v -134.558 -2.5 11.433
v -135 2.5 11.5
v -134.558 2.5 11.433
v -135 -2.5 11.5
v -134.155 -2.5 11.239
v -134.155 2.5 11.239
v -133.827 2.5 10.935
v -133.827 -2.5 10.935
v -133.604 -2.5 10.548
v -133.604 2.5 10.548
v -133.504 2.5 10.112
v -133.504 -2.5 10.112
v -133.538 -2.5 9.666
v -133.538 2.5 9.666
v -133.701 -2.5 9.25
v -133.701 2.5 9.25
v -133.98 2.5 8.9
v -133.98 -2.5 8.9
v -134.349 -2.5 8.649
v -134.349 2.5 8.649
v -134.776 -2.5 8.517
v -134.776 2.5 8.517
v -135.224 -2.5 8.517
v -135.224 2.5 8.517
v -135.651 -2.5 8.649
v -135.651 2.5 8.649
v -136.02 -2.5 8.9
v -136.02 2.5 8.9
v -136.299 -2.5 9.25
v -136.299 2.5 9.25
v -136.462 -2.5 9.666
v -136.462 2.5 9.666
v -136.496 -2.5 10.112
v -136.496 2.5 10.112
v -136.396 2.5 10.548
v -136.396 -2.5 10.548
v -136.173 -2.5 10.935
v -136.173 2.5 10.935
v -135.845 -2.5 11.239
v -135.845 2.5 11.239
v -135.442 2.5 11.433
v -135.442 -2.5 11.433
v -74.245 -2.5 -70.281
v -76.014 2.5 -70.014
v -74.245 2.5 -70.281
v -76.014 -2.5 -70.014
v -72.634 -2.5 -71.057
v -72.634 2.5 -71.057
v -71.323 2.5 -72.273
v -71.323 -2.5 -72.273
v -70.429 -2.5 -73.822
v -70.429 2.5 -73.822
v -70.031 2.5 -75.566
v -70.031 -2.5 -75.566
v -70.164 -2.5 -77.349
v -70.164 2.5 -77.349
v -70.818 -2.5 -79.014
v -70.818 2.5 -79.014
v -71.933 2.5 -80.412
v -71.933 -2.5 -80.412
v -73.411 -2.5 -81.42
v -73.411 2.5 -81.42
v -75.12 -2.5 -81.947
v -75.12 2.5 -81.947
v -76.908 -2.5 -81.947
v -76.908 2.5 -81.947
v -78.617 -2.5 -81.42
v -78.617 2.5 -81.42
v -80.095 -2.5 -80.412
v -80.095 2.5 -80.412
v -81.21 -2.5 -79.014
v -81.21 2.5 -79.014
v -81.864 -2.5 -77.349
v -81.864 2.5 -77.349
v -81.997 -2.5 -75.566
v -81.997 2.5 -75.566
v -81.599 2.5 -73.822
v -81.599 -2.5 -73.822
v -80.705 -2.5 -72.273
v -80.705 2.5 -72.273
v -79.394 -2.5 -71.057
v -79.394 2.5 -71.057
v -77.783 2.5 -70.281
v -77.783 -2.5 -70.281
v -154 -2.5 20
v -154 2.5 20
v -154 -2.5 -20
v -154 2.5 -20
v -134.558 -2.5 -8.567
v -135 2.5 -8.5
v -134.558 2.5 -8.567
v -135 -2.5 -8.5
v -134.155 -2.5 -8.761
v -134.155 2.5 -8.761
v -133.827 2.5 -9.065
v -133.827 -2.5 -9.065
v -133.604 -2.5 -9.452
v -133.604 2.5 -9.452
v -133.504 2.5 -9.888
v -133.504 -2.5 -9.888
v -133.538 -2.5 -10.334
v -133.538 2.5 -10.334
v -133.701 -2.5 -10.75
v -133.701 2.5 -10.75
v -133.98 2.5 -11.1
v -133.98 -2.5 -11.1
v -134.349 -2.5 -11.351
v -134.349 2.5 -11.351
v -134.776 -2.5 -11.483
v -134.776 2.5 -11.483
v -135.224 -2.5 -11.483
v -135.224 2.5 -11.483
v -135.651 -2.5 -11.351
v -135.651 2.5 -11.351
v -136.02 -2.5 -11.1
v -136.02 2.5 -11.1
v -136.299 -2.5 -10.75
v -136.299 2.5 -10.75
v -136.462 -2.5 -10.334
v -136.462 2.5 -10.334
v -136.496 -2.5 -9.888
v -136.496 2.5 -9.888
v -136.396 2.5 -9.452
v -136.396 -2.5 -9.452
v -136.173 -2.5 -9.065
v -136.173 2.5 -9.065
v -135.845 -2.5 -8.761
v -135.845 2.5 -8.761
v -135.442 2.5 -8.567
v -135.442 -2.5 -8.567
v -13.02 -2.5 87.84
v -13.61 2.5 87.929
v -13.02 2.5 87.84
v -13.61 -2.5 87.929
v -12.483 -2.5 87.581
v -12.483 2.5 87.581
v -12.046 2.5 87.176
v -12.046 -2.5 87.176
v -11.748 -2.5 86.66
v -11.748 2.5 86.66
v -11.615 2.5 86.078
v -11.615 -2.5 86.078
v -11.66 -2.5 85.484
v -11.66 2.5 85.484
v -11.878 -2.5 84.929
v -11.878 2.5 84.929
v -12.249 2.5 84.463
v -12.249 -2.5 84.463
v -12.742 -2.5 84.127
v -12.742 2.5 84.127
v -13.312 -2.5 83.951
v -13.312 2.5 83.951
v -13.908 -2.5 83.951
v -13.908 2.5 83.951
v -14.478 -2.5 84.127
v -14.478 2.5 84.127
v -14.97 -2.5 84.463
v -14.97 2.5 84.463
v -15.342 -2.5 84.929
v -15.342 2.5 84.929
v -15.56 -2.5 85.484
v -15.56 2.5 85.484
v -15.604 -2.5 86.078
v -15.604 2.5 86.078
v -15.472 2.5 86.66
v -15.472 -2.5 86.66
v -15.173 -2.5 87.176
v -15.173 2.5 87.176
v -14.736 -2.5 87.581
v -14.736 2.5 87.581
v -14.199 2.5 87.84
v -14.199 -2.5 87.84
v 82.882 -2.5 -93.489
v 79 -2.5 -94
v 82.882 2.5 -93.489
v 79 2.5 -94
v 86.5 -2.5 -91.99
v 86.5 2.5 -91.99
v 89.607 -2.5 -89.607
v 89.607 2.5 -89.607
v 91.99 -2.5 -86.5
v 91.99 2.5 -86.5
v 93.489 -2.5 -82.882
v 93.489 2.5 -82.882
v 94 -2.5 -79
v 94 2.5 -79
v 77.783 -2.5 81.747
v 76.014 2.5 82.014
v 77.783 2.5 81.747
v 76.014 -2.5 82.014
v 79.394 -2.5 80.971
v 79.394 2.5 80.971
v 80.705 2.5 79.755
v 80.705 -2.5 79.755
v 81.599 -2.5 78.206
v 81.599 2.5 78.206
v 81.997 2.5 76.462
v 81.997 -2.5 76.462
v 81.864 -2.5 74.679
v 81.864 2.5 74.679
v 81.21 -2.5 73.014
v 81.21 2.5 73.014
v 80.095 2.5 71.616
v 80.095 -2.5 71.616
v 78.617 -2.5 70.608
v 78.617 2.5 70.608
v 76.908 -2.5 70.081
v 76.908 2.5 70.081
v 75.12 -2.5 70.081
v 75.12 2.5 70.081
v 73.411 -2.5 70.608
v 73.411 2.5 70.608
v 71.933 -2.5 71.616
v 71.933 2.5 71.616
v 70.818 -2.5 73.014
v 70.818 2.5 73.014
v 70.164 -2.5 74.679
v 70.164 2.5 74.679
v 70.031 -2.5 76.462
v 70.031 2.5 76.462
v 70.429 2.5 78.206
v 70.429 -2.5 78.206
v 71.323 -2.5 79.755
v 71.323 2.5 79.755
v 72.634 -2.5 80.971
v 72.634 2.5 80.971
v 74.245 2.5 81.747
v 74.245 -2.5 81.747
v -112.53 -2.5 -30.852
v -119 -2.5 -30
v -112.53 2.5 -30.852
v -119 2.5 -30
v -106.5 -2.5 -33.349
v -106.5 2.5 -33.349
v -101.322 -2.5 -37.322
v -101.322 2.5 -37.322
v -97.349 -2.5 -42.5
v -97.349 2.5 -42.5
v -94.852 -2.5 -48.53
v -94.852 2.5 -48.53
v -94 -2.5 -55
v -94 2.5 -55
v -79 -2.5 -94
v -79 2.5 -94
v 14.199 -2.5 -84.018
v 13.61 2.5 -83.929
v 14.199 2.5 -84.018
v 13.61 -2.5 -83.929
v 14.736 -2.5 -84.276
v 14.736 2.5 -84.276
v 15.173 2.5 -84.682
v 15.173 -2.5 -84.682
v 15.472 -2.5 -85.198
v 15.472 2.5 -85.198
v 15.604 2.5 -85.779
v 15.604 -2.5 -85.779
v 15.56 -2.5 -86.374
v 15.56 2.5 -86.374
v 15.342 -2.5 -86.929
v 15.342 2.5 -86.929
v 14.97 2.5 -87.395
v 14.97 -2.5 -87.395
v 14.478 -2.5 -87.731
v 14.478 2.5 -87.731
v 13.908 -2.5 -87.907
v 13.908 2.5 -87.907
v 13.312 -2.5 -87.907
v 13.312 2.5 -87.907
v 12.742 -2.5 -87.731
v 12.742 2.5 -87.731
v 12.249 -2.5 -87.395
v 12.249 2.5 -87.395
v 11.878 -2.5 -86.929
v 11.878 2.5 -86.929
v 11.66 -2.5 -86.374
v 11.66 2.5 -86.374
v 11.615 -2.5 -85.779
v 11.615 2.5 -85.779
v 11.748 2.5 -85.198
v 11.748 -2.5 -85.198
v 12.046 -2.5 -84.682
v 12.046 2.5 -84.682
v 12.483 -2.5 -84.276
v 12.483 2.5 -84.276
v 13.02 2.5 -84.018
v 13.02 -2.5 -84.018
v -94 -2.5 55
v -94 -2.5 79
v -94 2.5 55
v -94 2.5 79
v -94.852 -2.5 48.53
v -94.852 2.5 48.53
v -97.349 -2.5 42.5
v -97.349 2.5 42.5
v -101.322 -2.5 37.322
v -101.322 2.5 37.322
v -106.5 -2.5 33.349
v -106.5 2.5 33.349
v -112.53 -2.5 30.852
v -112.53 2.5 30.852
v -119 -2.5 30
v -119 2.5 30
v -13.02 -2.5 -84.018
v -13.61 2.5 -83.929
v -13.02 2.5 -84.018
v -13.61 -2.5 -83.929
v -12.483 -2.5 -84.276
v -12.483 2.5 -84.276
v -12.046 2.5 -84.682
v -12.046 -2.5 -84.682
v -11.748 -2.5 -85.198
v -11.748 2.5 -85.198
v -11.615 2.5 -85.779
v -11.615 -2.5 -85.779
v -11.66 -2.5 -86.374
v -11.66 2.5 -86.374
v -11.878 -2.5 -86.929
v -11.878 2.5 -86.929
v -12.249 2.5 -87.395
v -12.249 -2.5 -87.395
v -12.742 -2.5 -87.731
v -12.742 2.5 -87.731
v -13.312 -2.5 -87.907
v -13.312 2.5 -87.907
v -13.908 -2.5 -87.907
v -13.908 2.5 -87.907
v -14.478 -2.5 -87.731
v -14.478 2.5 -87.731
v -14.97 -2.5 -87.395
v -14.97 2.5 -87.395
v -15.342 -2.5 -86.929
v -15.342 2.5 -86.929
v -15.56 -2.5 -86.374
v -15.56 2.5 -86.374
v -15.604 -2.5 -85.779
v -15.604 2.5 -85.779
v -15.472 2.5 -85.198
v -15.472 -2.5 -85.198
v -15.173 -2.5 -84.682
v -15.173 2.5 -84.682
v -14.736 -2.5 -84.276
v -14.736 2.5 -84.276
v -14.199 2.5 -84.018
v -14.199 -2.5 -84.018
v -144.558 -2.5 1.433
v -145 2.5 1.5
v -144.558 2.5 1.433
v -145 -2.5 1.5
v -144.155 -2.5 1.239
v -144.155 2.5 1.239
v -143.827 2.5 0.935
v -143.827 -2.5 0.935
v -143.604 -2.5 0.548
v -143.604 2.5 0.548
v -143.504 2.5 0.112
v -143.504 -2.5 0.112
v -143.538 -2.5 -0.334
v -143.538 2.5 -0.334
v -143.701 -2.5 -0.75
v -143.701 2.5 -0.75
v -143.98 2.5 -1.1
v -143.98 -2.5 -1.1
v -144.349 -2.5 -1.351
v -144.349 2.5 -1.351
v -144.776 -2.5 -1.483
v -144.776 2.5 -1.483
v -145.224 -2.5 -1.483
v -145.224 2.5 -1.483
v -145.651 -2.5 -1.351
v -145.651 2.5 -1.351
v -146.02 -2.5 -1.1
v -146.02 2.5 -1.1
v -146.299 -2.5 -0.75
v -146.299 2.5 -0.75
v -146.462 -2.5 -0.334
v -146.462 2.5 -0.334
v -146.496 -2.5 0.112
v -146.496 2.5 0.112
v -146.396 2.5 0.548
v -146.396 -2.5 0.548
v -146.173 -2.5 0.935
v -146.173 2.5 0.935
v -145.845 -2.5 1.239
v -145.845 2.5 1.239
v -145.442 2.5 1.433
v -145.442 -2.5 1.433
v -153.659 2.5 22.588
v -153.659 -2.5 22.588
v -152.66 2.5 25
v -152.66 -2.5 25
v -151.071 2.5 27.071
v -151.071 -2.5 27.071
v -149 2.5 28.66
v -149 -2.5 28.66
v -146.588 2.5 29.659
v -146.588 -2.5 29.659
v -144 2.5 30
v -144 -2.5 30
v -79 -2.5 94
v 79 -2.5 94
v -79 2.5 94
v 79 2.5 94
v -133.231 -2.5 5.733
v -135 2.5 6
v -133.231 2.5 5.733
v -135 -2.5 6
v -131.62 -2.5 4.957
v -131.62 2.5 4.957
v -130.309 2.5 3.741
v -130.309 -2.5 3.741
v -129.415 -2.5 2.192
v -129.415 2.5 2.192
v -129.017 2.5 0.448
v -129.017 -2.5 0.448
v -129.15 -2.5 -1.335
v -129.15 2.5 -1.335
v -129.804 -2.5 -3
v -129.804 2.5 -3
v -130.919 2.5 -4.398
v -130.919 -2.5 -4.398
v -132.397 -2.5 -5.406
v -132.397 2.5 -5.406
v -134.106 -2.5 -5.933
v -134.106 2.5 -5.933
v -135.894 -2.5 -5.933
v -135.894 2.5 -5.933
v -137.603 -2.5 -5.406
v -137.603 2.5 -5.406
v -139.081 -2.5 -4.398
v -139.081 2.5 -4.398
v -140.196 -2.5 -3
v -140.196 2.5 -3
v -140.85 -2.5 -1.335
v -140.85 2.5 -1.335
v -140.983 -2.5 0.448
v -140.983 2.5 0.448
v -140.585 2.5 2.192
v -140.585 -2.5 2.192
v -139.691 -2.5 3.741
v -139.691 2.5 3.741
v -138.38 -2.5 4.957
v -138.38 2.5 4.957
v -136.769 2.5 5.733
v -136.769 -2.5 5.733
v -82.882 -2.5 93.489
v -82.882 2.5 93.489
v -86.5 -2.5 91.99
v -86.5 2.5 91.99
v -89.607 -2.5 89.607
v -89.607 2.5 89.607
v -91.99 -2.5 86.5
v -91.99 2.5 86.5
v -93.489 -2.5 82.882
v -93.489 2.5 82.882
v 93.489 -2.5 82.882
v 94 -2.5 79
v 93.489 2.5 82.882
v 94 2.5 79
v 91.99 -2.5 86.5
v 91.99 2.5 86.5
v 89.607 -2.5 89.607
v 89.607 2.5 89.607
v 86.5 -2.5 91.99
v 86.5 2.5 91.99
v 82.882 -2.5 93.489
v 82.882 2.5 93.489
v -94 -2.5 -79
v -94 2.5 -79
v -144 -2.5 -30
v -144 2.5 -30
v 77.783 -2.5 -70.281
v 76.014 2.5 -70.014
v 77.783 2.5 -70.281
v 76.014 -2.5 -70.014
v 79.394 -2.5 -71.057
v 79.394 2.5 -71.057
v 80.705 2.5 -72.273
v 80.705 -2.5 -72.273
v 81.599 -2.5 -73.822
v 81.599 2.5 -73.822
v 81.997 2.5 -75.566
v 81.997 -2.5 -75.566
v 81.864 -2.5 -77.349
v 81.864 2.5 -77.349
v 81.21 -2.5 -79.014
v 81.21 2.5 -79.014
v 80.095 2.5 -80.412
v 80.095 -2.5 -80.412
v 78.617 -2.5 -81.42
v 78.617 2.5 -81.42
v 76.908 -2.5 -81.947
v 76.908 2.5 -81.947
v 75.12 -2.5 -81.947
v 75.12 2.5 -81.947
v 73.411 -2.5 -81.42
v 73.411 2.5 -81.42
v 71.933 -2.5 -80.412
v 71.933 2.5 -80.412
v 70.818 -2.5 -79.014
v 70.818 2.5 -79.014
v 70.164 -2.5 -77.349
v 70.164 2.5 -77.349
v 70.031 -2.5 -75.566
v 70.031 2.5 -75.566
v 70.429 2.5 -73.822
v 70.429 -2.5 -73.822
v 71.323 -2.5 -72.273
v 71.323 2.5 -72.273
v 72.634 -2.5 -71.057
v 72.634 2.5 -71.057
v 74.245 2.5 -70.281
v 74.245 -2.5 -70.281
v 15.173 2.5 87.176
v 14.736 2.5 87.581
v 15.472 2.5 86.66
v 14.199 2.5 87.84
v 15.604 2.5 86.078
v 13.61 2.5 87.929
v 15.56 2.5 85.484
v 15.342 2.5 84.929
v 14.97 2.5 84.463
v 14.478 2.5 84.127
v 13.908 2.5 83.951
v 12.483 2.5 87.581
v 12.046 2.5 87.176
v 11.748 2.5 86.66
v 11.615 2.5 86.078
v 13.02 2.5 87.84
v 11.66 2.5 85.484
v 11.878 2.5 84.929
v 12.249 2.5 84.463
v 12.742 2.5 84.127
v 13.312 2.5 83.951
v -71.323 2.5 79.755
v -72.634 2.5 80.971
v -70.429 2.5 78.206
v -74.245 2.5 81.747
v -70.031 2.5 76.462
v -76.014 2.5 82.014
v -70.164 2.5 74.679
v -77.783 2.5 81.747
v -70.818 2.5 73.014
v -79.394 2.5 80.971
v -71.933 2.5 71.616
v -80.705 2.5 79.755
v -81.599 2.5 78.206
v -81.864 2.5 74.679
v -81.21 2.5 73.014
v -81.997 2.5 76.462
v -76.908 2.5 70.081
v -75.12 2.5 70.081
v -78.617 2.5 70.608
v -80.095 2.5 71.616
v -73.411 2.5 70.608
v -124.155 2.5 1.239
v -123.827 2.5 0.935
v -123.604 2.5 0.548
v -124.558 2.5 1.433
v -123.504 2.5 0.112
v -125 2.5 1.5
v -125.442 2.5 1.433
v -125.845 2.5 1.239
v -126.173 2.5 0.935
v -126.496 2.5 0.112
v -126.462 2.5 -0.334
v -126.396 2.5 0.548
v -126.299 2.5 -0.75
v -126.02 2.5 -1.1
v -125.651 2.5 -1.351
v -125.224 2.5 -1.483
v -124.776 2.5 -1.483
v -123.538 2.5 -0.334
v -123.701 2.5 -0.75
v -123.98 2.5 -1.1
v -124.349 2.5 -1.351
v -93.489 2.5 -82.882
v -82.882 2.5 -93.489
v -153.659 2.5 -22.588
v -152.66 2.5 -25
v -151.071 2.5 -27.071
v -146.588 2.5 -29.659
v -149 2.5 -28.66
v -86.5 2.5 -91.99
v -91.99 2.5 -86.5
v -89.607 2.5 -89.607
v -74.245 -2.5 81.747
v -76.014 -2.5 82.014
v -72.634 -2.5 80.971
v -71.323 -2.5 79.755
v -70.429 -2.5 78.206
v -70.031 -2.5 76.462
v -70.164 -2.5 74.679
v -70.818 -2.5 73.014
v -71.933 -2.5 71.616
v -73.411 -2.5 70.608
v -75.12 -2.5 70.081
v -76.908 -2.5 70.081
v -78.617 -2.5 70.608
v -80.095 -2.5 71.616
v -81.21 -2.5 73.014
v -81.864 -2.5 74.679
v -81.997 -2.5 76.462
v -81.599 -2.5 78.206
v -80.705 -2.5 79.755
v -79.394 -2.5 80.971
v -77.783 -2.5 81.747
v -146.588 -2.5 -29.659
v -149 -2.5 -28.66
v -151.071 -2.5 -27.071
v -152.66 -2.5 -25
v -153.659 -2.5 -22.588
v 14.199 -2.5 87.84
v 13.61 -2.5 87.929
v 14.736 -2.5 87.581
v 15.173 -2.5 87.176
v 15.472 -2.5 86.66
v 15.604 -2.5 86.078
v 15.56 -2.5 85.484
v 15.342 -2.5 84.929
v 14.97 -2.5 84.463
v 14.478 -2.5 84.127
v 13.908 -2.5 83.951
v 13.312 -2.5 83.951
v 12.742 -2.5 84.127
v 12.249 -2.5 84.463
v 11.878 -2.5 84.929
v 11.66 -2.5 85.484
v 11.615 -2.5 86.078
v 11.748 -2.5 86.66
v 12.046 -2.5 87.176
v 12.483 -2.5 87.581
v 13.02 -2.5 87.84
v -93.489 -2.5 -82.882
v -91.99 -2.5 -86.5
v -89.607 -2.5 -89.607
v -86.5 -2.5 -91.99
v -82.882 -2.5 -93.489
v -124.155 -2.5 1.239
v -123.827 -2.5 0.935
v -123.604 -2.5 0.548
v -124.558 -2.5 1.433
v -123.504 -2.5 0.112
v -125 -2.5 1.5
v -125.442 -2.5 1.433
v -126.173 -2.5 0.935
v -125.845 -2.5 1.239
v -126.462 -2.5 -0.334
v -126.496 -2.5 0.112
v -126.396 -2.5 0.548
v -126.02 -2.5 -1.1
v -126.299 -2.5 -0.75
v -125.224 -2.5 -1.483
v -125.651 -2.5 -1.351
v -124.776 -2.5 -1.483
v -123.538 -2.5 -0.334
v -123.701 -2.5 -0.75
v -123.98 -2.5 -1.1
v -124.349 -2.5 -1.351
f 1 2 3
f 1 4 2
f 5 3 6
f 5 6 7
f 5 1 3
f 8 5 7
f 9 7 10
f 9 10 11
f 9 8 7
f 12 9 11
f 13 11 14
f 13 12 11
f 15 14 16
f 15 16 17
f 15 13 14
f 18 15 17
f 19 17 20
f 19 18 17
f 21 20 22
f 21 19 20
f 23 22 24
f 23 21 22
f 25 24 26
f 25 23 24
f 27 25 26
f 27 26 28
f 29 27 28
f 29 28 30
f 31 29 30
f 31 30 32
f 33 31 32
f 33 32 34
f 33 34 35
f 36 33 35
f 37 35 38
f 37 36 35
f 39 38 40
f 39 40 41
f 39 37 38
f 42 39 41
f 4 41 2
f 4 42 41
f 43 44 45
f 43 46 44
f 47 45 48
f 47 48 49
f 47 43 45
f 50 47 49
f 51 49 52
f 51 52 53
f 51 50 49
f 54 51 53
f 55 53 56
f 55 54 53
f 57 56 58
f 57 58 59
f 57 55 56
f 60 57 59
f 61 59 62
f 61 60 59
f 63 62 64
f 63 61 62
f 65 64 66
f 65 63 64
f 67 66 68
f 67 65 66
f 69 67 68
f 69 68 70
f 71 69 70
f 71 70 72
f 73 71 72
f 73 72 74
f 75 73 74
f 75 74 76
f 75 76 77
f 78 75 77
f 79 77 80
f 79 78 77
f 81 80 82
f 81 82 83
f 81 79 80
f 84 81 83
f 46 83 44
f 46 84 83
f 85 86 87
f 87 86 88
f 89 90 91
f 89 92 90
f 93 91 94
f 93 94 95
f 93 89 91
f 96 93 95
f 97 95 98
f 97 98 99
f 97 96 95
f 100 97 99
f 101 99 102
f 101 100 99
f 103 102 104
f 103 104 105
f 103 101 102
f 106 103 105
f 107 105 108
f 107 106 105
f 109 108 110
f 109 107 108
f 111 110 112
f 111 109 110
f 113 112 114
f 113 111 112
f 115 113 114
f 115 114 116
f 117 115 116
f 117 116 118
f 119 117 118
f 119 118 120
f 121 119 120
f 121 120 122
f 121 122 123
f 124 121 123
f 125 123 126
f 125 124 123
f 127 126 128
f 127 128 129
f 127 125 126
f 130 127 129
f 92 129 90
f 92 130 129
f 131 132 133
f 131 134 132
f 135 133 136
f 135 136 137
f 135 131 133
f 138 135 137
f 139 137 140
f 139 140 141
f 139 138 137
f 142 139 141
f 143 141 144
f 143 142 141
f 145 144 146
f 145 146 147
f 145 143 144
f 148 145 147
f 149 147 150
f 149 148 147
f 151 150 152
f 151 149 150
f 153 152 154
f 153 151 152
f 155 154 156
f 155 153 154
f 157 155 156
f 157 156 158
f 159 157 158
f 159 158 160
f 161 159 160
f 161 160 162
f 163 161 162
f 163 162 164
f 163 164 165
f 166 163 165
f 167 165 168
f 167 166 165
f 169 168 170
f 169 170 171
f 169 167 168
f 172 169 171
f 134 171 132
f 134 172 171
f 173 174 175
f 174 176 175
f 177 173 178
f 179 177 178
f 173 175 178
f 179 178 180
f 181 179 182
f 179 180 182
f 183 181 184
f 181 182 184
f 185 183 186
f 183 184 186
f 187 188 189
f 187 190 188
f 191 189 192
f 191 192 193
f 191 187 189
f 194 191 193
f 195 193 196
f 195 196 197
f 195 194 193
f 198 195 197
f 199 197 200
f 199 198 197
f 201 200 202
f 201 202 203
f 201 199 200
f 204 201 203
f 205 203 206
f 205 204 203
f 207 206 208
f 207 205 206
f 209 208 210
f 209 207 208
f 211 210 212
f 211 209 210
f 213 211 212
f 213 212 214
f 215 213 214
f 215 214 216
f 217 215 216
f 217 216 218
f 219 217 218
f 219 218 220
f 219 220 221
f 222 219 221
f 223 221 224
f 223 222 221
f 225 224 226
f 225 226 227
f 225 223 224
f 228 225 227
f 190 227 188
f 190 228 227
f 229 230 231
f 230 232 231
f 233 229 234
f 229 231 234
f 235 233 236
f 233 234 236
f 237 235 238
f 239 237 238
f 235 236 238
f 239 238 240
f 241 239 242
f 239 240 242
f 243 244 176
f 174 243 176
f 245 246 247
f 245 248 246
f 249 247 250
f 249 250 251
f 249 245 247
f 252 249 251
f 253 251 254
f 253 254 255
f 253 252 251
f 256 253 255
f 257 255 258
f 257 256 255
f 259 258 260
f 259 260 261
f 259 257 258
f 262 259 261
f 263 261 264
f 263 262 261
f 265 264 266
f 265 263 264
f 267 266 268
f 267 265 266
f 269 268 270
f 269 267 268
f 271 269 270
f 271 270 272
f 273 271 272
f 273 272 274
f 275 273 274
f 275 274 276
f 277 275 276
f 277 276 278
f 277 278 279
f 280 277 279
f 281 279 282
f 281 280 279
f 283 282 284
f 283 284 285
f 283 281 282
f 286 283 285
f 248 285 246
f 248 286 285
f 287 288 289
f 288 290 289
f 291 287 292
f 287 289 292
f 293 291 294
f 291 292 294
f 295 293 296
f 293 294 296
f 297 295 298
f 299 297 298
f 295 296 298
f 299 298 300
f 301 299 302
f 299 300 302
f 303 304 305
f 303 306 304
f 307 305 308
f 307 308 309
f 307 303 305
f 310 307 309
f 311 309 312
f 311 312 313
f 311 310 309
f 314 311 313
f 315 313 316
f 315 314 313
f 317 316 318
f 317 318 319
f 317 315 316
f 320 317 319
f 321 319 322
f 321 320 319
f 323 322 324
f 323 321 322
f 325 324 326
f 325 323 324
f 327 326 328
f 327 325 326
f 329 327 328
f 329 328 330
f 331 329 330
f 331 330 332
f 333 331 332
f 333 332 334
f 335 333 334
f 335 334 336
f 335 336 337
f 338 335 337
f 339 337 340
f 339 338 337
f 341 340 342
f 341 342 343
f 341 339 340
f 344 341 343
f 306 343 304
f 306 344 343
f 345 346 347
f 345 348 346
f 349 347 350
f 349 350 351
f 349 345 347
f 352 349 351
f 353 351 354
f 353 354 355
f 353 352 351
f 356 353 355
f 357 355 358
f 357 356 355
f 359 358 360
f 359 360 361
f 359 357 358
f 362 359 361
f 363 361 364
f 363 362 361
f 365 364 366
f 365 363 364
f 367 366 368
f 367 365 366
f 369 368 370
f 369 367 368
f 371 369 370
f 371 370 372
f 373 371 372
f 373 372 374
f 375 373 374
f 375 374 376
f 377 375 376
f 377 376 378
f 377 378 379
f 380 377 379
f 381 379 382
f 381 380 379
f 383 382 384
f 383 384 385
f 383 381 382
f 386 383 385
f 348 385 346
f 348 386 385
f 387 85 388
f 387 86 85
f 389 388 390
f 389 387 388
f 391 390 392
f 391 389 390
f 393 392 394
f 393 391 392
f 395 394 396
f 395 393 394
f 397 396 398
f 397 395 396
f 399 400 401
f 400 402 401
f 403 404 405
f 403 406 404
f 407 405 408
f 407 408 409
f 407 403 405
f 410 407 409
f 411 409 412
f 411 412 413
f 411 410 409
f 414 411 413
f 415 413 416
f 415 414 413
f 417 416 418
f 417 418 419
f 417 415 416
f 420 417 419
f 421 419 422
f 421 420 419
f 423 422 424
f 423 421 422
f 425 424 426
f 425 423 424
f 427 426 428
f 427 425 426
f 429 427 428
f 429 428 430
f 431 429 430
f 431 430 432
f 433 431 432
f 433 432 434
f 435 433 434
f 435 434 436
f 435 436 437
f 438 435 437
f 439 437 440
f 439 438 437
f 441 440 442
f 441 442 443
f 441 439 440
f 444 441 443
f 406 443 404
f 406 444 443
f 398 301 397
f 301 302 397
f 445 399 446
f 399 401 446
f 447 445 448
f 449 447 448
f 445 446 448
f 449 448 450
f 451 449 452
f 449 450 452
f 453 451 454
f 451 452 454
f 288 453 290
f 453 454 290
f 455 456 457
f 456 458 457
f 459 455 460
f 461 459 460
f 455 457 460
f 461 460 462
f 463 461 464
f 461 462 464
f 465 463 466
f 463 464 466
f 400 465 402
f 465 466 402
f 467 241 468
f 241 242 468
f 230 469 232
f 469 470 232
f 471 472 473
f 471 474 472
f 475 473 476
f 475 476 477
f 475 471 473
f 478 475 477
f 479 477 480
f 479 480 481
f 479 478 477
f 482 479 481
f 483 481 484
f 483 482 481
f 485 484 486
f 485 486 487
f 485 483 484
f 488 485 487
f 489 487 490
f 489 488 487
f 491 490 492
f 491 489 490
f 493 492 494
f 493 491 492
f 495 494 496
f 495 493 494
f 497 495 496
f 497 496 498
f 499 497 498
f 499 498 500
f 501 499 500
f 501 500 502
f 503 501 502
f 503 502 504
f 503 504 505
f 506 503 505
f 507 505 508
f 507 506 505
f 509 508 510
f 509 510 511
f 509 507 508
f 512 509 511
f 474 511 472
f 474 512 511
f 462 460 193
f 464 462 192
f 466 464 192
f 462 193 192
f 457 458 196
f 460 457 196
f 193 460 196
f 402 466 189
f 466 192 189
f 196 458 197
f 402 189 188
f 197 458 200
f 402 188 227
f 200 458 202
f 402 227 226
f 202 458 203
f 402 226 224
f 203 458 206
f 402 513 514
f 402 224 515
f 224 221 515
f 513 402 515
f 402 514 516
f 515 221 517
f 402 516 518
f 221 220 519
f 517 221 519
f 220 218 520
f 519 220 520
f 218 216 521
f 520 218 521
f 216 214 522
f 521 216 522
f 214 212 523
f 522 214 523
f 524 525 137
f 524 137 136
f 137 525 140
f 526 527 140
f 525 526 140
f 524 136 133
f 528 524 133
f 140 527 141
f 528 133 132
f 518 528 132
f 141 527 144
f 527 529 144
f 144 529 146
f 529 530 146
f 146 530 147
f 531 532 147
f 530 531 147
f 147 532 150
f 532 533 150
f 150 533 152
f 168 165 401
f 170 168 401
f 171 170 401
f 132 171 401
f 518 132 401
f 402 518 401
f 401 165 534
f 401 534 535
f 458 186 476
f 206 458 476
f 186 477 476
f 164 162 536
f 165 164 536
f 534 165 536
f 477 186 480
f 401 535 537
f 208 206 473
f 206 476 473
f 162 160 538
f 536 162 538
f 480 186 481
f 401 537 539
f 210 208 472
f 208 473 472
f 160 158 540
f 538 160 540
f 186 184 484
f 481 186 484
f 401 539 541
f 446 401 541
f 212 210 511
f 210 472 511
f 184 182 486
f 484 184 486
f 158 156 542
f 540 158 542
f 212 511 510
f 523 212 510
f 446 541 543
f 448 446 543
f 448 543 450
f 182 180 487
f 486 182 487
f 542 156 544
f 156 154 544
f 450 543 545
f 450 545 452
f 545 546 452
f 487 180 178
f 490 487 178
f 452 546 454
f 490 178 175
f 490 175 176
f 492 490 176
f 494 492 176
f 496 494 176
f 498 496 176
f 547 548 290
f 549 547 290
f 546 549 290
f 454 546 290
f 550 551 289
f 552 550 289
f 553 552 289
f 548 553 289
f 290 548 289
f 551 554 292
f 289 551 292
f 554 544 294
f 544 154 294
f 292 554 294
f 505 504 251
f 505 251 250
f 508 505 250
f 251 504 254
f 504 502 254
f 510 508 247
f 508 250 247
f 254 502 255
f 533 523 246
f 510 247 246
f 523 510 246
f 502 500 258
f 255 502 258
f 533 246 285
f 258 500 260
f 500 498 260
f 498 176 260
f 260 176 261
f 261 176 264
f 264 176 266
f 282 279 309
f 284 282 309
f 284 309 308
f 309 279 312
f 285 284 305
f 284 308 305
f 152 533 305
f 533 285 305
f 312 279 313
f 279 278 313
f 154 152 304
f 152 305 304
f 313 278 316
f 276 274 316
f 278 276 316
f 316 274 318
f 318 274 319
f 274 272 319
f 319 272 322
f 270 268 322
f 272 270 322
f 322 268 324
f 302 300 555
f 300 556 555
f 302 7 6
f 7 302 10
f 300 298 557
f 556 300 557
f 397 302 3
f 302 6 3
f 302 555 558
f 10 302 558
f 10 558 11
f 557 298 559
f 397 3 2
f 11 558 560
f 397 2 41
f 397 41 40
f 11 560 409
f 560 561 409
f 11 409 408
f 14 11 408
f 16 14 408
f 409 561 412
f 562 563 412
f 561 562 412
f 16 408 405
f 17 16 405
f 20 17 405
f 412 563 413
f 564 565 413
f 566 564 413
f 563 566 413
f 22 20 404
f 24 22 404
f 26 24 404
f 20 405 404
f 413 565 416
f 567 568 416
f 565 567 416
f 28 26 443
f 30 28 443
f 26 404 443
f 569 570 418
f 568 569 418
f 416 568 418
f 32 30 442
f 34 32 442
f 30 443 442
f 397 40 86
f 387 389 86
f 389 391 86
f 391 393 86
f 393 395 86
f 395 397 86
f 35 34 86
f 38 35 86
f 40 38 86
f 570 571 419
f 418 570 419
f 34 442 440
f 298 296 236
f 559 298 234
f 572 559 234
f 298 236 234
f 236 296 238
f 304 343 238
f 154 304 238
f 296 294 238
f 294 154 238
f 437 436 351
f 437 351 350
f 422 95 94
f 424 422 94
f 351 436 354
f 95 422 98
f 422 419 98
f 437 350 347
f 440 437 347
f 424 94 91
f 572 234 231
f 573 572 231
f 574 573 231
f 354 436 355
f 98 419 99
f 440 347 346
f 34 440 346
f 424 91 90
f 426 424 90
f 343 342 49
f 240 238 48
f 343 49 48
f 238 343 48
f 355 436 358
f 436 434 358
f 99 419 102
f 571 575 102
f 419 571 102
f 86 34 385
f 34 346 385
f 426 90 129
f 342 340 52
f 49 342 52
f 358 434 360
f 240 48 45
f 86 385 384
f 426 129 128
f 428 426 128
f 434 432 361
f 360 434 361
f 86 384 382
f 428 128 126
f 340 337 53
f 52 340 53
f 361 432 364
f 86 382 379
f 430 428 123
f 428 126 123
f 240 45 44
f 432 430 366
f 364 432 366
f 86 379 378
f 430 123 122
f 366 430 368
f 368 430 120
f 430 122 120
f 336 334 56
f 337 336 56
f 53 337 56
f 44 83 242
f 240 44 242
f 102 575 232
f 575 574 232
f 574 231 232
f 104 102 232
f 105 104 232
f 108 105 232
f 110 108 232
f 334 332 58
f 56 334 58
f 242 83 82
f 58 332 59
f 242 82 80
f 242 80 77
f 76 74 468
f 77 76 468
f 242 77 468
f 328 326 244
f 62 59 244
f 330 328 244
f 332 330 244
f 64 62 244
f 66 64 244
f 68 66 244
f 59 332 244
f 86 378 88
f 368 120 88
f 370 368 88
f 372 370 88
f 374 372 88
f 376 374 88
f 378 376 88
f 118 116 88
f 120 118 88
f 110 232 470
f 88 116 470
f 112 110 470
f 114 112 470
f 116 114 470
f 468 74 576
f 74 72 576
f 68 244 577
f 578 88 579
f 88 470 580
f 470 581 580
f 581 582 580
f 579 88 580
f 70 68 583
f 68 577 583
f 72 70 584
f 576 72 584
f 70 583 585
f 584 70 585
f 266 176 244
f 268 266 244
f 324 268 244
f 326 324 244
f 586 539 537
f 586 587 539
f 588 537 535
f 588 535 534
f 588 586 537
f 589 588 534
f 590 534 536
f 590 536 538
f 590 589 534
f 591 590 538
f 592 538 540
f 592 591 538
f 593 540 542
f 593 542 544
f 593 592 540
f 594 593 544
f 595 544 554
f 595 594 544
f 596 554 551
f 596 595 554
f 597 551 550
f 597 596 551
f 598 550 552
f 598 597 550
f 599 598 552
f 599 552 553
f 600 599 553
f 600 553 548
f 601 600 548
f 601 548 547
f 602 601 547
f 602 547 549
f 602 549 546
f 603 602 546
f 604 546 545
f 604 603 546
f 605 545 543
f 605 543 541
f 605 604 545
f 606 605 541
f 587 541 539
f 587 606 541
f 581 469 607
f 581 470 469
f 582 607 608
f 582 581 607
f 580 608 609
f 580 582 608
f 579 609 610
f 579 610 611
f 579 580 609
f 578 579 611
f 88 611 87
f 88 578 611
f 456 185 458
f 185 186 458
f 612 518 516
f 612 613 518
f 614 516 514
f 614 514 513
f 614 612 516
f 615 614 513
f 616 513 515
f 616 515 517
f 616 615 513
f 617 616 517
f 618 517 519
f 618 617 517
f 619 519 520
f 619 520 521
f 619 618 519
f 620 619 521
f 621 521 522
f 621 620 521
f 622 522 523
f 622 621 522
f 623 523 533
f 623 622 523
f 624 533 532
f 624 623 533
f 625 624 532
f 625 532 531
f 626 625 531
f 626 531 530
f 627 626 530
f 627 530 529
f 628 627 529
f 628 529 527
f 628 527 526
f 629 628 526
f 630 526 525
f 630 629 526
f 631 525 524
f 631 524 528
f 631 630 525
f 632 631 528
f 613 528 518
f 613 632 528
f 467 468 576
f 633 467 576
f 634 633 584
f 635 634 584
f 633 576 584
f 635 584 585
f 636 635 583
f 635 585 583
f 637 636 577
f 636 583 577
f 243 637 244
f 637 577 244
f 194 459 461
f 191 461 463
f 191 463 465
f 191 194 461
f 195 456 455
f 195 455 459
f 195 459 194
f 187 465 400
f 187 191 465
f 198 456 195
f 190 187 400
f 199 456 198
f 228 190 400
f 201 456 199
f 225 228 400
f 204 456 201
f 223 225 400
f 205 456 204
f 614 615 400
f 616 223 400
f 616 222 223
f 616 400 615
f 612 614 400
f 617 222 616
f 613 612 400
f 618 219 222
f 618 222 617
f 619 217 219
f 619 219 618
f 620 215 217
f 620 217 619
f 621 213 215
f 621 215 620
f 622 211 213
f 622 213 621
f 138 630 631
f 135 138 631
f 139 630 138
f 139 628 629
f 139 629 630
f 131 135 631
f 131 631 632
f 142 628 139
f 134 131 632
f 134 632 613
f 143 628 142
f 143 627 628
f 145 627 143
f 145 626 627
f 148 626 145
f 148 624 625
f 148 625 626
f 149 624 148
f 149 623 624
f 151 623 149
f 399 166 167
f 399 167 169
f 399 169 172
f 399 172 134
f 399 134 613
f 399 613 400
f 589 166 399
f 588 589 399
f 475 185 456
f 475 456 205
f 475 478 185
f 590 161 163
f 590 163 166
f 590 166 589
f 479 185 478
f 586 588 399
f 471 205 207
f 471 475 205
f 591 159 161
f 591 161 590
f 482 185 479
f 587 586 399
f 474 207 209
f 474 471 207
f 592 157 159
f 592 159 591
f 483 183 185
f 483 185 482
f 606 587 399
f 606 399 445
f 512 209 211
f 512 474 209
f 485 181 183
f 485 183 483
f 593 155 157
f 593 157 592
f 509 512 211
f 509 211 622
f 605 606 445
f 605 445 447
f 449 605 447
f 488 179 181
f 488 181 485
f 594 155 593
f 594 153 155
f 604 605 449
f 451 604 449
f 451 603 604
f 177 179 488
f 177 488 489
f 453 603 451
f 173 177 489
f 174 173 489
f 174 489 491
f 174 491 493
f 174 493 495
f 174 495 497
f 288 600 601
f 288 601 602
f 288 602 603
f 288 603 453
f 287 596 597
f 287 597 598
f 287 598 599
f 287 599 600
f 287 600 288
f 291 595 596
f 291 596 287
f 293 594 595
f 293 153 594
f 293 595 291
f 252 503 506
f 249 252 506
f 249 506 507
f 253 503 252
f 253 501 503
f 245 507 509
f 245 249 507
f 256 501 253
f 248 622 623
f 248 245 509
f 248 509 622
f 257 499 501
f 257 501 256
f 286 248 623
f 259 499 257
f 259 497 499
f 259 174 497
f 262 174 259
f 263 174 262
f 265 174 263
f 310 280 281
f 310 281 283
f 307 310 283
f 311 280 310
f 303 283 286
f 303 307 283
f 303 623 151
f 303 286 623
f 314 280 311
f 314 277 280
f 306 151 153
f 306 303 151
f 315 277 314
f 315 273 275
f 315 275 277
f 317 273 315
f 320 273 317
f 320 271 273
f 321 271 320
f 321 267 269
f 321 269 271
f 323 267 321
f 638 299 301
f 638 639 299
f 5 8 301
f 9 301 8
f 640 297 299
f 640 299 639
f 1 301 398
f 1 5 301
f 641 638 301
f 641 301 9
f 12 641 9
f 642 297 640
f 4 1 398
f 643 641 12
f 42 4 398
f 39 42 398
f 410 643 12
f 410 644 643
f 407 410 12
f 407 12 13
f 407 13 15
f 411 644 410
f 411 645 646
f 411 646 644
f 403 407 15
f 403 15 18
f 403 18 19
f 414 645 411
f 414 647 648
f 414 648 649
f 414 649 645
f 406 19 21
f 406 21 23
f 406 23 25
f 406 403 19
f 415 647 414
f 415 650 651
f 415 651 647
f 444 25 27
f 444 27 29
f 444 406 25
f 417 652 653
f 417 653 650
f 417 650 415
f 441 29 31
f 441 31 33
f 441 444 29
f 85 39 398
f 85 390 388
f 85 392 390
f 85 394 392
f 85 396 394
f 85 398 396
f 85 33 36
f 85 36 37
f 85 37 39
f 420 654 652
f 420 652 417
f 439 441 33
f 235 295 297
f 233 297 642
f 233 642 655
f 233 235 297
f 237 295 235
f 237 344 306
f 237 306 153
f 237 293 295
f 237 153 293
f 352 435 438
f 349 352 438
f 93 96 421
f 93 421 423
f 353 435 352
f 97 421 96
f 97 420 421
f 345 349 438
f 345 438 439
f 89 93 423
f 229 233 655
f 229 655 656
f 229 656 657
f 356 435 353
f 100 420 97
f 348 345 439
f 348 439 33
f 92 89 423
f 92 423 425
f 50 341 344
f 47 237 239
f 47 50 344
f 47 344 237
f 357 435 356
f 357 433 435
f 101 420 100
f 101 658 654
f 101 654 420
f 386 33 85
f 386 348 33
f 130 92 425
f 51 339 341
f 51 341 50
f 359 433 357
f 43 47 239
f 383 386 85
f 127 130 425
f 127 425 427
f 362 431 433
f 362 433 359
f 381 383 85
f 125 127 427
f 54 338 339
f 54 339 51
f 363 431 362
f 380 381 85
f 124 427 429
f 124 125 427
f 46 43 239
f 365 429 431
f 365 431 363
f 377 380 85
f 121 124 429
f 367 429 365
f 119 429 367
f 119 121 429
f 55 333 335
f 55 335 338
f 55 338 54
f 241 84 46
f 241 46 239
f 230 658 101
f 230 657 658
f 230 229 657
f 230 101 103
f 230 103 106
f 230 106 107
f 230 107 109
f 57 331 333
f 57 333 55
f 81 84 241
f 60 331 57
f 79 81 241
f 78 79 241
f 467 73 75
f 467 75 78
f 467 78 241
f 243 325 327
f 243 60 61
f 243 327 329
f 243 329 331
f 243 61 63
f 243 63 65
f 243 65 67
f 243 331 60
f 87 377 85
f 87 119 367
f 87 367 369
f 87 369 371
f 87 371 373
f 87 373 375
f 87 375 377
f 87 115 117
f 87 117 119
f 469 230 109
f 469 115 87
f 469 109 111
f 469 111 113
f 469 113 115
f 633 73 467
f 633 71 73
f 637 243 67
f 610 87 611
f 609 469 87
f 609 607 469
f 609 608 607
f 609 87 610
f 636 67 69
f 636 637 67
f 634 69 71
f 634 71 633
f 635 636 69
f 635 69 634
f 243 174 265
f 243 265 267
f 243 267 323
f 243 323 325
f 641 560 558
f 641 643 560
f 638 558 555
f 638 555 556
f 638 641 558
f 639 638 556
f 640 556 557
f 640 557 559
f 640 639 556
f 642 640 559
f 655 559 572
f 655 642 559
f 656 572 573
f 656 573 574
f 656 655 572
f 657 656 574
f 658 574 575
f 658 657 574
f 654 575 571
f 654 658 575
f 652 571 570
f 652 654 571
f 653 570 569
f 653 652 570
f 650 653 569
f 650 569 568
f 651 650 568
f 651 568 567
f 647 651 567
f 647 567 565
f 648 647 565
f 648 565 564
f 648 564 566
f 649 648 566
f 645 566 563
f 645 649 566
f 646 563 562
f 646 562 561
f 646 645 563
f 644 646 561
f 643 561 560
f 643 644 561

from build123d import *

# Parameters (mm, degrees)
SKETCH1_R           = 6
SKETCH1_R_2         = 1.5
SKETCH1_R_3         = 2
BOSS_EXTRUDE1_DEPTH = 2.5
FILLET1_R           = 25
FILLET2_R           = 10


with BuildPart() as part:
    # Sketch1 → Boss-Extrude1 (new, symmetric)
    with BuildSketch(Plane(origin=(0, 0, 0), x_dir=(1, 0, 0), z_dir=(0, 1, 0))):
        with BuildLine():
            Line((-79, 94), (79, 94))
            ThreePointArc((79, 94), (89.606601718, 89.606601718), (94, 79))
            Line((94, 79), (94, -79))
            ThreePointArc((94, -79), (89.606601718, -89.606601718), (79, -94))
            Line((79, -94), (-79, -94))
            ThreePointArc((-79, -94), (-89.606601718, -89.606601718), (-94, -79))
            Line((-94, -79), (-94, -30))
            Line((-94, -30), (-154, -30))
            Line((-154, -30), (-154, 30))
            Line((-154, 30), (-94, 30))
            Line((-94, 30), (-94, 79))
            ThreePointArc((-94, 79), (-89.606601718, 89.606601718), (-79, 94))
        make_face()
        with Locations(Location((-76.013978978, 76.013978978, 0), (0, 0, 270))):
            Circle(SKETCH1_R, mode=Mode.SUBTRACT)
        with Locations(Location((76.013978978, 76.013978978, 0), (0, 0, 270))):
            Circle(SKETCH1_R, mode=Mode.SUBTRACT)
        with Locations(Location((76.013978978, -76.013978978, 0), (0, 0, 270))):
            Circle(SKETCH1_R, mode=Mode.SUBTRACT)
        with Locations(Location((-76.013978978, -76.013978978, 0), (0, 0, 270))):
            Circle(SKETCH1_R, mode=Mode.SUBTRACT)
        with Locations(Location((-135, -10, 0), (0, 0, 270))):
            Circle(SKETCH1_R_2, mode=Mode.SUBTRACT)
        with Locations(Location((-145, 0, 0), (0, 0, 270))):
            Circle(SKETCH1_R_2, mode=Mode.SUBTRACT)
        with Locations(Location((-135, 10, 0), (0, 0, 270))):
            Circle(SKETCH1_R_2, mode=Mode.SUBTRACT)
        with Locations(Location((-125, 0, 0), (0, 0, 270))):
            Circle(SKETCH1_R_2, mode=Mode.SUBTRACT)
        with Locations(Location((-135, 0, 0), (0, 0, 270))):
            Circle(SKETCH1_R, mode=Mode.SUBTRACT)
        with Locations(Location((13.609798459, 85.928885632, 0), (0, 0, 270))):
            Circle(SKETCH1_R_3, mode=Mode.SUBTRACT)
        with Locations(Location((13.609798458, -85.928885632, 0), (0, 0, 270))):
            Circle(SKETCH1_R_3, mode=Mode.SUBTRACT)
        with Locations(Location((-13.609798458, 85.928885632, 0), (0, 0, 270))):
            Circle(SKETCH1_R_3, mode=Mode.SUBTRACT)
        with Locations(Location((-13.609798459, -85.928885632, 0), (0, 0, 270))):
            Circle(SKETCH1_R_3, mode=Mode.SUBTRACT)
    extrude(amount=BOSS_EXTRUDE1_DEPTH, both=True)

    # Fillet1
    fillet1_edges = [part.edges().sort_by_distance(p)[0] for p in [
        (-94, 0, 30),
        (-94, 0, -30),
    ]]
    fillet(fillet1_edges, radius=FILLET1_R)

    # Fillet2
    fillet2_edges = [part.edges().sort_by_distance(p)[0] for p in [
        (-154, 0, 30),
        (-154, 0, -30),
    ]]
    fillet(fillet2_edges, radius=FILLET2_R)


solid = part.part
